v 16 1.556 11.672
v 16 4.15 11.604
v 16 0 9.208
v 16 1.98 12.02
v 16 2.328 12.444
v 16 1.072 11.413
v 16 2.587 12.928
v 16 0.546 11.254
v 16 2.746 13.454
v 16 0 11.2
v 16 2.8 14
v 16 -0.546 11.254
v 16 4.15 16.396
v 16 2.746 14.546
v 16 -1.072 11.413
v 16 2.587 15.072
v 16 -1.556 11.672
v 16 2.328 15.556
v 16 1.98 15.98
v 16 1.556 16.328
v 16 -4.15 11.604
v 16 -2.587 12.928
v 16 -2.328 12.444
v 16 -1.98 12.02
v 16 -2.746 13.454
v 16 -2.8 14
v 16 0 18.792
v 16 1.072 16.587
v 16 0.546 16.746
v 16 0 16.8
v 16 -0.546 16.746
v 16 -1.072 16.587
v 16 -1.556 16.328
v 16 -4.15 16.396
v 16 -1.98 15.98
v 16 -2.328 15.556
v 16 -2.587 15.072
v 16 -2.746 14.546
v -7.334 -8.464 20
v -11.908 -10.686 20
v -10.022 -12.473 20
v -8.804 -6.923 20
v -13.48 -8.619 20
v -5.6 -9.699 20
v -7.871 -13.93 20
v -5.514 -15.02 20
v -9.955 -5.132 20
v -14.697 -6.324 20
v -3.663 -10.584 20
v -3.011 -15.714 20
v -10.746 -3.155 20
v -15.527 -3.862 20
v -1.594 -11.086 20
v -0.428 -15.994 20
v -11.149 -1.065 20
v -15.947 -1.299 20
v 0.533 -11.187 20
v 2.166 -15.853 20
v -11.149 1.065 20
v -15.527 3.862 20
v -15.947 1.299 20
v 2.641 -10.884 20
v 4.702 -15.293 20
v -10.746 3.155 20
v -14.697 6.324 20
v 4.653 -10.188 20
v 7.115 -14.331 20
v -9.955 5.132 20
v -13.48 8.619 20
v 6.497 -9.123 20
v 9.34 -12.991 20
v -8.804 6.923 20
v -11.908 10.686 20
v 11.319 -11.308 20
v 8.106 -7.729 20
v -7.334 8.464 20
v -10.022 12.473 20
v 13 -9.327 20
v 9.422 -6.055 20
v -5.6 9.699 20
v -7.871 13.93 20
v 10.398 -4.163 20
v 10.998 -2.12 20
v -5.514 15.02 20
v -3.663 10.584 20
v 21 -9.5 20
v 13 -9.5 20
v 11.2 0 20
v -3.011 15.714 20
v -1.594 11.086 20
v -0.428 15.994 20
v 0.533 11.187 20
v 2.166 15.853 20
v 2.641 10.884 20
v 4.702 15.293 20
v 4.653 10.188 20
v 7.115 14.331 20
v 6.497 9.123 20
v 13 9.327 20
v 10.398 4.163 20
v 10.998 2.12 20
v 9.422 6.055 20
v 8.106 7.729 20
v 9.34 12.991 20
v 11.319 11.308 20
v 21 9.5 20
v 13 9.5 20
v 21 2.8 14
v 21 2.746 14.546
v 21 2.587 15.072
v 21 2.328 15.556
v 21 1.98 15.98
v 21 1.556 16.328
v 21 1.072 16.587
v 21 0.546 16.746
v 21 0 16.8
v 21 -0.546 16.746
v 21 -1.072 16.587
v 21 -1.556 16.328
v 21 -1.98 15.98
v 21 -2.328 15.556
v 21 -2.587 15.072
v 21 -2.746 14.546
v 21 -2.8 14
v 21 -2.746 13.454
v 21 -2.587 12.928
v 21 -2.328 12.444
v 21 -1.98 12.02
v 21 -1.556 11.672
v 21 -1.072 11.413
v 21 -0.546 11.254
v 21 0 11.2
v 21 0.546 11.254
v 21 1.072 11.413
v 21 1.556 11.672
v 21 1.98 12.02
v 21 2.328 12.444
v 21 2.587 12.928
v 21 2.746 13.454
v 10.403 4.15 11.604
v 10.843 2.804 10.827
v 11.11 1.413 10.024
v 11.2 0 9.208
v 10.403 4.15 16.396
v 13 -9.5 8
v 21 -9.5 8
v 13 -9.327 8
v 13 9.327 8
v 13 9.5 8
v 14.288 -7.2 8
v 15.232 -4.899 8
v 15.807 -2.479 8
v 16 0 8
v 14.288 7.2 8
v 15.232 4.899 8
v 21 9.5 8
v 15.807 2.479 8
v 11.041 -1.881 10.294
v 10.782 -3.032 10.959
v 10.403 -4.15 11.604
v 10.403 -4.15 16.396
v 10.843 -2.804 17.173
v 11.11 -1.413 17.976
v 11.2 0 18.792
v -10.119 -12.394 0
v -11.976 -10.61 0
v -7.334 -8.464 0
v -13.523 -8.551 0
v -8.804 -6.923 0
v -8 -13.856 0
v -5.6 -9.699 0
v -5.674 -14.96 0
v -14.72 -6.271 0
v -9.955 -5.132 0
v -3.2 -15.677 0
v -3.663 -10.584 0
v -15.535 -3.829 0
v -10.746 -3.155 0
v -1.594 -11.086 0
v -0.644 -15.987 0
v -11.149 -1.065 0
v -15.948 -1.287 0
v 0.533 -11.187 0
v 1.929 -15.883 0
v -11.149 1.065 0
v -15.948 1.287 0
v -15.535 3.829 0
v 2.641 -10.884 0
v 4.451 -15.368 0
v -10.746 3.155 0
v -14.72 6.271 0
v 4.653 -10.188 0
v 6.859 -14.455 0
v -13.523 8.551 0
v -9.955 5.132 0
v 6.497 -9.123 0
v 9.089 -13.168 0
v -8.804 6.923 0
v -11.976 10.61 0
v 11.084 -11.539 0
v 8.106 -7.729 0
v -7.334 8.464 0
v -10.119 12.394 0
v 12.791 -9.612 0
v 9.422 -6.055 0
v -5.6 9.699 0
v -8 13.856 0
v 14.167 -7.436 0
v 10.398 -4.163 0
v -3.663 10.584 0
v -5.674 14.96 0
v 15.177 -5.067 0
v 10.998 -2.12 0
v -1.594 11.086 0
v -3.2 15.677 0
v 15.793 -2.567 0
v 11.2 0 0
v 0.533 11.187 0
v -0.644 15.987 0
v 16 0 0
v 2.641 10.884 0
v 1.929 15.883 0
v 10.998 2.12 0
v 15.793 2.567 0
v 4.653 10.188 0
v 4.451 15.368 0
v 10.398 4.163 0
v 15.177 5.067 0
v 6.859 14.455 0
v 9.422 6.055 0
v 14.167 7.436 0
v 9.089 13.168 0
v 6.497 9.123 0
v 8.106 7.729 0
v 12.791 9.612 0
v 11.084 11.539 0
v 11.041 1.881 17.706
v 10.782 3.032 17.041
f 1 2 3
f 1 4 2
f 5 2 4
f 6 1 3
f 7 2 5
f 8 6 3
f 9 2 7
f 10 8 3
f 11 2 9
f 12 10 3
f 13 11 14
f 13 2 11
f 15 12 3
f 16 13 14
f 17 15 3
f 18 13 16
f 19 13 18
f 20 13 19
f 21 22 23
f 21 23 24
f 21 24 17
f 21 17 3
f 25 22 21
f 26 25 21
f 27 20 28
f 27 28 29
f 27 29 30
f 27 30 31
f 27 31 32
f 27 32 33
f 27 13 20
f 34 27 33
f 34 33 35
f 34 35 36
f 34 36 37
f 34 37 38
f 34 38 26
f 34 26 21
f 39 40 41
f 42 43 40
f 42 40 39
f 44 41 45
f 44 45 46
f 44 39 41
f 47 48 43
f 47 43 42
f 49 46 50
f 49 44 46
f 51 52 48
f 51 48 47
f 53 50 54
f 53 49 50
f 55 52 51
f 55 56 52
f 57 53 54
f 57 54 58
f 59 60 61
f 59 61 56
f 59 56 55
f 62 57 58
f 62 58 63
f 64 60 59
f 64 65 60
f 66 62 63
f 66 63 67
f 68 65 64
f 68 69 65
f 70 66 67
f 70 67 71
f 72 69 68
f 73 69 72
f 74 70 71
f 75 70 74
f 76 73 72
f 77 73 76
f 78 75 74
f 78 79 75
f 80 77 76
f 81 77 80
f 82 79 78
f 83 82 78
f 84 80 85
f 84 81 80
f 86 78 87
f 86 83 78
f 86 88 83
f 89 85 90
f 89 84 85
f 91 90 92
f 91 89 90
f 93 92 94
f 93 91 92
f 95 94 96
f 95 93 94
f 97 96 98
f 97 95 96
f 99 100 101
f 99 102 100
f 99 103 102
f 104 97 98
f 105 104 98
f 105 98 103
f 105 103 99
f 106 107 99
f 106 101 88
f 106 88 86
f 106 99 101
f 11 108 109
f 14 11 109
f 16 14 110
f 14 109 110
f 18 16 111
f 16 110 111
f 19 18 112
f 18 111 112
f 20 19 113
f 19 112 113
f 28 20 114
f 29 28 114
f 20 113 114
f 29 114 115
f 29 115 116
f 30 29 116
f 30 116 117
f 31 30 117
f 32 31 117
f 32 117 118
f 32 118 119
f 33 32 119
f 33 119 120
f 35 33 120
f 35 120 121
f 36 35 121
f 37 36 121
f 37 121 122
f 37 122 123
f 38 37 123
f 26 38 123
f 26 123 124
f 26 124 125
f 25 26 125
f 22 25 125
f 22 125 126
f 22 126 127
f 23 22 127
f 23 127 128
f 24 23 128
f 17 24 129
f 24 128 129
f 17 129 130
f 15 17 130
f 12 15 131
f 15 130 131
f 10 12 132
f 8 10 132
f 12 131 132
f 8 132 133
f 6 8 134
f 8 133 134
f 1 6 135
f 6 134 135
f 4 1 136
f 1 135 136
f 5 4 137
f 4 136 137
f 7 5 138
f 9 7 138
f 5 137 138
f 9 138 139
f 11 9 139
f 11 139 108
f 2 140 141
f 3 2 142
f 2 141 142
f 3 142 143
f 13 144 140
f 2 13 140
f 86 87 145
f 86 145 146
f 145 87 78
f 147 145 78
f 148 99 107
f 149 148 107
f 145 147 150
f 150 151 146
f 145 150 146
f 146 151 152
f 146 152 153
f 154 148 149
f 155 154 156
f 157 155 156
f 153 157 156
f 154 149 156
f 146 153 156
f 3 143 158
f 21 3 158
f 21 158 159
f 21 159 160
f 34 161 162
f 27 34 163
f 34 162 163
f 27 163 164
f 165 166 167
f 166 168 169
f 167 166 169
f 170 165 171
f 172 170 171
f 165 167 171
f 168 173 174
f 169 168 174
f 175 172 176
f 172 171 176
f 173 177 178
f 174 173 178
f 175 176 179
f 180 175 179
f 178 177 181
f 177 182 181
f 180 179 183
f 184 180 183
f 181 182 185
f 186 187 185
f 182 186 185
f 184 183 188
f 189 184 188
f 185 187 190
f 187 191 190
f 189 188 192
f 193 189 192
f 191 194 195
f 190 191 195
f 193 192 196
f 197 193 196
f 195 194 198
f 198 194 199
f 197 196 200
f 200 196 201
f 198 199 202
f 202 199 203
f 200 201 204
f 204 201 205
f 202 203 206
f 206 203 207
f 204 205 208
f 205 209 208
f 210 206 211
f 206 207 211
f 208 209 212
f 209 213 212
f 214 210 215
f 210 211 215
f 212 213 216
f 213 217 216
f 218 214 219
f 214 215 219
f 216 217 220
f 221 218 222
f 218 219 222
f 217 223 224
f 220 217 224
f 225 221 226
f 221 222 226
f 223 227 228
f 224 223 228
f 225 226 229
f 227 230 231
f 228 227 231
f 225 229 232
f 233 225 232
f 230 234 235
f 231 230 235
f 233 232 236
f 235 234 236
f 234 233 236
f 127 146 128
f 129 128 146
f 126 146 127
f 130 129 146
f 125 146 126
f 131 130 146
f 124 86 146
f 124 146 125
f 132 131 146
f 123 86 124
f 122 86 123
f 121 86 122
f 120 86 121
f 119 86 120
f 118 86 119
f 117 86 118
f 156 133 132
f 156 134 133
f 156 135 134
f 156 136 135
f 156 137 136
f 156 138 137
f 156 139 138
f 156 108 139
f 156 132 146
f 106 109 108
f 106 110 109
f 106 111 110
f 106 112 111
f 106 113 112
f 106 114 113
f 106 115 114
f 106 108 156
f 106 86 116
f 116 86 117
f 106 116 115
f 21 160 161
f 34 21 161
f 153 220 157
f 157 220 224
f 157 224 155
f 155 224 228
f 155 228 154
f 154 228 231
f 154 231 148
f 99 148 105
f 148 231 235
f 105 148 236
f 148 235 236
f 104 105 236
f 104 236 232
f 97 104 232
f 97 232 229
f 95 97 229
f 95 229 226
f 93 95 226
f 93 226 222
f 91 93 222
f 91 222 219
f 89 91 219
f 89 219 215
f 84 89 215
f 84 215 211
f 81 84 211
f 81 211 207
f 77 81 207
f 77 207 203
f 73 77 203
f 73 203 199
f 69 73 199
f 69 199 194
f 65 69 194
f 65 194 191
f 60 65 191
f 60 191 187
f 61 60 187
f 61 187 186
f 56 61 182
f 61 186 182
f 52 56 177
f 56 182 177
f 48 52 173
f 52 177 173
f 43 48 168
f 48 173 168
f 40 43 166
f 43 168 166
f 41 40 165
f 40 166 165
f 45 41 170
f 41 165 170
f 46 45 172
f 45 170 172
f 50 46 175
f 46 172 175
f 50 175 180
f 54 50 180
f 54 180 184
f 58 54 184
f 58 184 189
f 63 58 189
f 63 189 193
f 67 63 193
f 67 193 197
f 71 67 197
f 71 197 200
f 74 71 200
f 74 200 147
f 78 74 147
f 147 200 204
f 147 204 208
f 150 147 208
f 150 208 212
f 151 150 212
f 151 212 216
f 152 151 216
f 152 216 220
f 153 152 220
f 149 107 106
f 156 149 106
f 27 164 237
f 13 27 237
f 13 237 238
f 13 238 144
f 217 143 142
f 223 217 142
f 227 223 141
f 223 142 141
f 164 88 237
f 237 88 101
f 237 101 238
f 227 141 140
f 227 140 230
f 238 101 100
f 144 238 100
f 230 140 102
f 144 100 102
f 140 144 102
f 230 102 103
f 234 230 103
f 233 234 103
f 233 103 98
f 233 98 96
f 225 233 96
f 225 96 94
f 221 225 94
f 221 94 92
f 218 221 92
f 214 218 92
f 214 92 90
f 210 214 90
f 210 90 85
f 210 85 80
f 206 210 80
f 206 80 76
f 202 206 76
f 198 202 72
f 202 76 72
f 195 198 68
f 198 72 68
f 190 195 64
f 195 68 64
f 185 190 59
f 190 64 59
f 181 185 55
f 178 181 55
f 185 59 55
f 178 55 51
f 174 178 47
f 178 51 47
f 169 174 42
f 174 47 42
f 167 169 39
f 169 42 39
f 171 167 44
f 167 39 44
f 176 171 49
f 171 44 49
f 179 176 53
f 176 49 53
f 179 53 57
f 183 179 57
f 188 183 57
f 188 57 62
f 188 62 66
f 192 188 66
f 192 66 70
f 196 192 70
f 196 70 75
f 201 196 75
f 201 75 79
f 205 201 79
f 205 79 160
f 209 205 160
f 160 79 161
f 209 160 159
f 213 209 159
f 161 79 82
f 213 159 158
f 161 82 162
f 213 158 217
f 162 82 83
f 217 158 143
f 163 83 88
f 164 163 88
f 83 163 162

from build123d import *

# Parameters (mm, degrees)
SKETCH_R        = 16
PAD_DEPTH       = 20
SKETCH001_R     = 11.2
POCKET_DEPTH    = 20.001
SKETCH002_W     = 8
SKETCH002_H     = 19
PAD001_DEPTH    = 12
POCKET001_DEPTH = 3
SKETCH008_R     = 2.8
POCKET002_DEPTH = 15


with BuildPart() as part:
    # Sketch → Pad (new body)
    with BuildSketch(Plane.XY):
        Circle(SKETCH_R)
    extrude(amount=PAD_DEPTH)

    # Sketch001 → Pocket (cut, through all)
    with BuildSketch(Plane.XY.offset(20)):
        Circle(SKETCH001_R)
    extrude(amount=-POCKET_DEPTH, mode=Mode.SUBTRACT)

    # Sketch002 → Pad001 (new body)
    with BuildSketch(Plane.XY.offset(20)):
        with Locations((17, 0)):
            Rectangle(SKETCH002_W, SKETCH002_H)
    extrude(amount=-PAD001_DEPTH)

    # Sketch005 → Pocket001 (cut, symmetric)
    with BuildSketch(Plane(origin=(13, 0, 0), x_dir=(0, -1, 0), z_dir=(-1, 0, 0))):
        Polygon((0, 9.207993), (4.15, 11.603996), (4.15, 16.396004), (0, 18.792007), (-4.15, 16.396004), (-4.15, 11.603996), align=None)
    extrude(amount=POCKET001_DEPTH, both=True, mode=Mode.SUBTRACT)

    # Sketch008 → Pocket002 (cut)
    with BuildSketch(Plane.YZ.offset(21)):
        with Locations((0, 14)):
            Circle(SKETCH008_R)
    extrude(amount=-POCKET002_DEPTH, mode=Mode.SUBTRACT)


solid = part.part
